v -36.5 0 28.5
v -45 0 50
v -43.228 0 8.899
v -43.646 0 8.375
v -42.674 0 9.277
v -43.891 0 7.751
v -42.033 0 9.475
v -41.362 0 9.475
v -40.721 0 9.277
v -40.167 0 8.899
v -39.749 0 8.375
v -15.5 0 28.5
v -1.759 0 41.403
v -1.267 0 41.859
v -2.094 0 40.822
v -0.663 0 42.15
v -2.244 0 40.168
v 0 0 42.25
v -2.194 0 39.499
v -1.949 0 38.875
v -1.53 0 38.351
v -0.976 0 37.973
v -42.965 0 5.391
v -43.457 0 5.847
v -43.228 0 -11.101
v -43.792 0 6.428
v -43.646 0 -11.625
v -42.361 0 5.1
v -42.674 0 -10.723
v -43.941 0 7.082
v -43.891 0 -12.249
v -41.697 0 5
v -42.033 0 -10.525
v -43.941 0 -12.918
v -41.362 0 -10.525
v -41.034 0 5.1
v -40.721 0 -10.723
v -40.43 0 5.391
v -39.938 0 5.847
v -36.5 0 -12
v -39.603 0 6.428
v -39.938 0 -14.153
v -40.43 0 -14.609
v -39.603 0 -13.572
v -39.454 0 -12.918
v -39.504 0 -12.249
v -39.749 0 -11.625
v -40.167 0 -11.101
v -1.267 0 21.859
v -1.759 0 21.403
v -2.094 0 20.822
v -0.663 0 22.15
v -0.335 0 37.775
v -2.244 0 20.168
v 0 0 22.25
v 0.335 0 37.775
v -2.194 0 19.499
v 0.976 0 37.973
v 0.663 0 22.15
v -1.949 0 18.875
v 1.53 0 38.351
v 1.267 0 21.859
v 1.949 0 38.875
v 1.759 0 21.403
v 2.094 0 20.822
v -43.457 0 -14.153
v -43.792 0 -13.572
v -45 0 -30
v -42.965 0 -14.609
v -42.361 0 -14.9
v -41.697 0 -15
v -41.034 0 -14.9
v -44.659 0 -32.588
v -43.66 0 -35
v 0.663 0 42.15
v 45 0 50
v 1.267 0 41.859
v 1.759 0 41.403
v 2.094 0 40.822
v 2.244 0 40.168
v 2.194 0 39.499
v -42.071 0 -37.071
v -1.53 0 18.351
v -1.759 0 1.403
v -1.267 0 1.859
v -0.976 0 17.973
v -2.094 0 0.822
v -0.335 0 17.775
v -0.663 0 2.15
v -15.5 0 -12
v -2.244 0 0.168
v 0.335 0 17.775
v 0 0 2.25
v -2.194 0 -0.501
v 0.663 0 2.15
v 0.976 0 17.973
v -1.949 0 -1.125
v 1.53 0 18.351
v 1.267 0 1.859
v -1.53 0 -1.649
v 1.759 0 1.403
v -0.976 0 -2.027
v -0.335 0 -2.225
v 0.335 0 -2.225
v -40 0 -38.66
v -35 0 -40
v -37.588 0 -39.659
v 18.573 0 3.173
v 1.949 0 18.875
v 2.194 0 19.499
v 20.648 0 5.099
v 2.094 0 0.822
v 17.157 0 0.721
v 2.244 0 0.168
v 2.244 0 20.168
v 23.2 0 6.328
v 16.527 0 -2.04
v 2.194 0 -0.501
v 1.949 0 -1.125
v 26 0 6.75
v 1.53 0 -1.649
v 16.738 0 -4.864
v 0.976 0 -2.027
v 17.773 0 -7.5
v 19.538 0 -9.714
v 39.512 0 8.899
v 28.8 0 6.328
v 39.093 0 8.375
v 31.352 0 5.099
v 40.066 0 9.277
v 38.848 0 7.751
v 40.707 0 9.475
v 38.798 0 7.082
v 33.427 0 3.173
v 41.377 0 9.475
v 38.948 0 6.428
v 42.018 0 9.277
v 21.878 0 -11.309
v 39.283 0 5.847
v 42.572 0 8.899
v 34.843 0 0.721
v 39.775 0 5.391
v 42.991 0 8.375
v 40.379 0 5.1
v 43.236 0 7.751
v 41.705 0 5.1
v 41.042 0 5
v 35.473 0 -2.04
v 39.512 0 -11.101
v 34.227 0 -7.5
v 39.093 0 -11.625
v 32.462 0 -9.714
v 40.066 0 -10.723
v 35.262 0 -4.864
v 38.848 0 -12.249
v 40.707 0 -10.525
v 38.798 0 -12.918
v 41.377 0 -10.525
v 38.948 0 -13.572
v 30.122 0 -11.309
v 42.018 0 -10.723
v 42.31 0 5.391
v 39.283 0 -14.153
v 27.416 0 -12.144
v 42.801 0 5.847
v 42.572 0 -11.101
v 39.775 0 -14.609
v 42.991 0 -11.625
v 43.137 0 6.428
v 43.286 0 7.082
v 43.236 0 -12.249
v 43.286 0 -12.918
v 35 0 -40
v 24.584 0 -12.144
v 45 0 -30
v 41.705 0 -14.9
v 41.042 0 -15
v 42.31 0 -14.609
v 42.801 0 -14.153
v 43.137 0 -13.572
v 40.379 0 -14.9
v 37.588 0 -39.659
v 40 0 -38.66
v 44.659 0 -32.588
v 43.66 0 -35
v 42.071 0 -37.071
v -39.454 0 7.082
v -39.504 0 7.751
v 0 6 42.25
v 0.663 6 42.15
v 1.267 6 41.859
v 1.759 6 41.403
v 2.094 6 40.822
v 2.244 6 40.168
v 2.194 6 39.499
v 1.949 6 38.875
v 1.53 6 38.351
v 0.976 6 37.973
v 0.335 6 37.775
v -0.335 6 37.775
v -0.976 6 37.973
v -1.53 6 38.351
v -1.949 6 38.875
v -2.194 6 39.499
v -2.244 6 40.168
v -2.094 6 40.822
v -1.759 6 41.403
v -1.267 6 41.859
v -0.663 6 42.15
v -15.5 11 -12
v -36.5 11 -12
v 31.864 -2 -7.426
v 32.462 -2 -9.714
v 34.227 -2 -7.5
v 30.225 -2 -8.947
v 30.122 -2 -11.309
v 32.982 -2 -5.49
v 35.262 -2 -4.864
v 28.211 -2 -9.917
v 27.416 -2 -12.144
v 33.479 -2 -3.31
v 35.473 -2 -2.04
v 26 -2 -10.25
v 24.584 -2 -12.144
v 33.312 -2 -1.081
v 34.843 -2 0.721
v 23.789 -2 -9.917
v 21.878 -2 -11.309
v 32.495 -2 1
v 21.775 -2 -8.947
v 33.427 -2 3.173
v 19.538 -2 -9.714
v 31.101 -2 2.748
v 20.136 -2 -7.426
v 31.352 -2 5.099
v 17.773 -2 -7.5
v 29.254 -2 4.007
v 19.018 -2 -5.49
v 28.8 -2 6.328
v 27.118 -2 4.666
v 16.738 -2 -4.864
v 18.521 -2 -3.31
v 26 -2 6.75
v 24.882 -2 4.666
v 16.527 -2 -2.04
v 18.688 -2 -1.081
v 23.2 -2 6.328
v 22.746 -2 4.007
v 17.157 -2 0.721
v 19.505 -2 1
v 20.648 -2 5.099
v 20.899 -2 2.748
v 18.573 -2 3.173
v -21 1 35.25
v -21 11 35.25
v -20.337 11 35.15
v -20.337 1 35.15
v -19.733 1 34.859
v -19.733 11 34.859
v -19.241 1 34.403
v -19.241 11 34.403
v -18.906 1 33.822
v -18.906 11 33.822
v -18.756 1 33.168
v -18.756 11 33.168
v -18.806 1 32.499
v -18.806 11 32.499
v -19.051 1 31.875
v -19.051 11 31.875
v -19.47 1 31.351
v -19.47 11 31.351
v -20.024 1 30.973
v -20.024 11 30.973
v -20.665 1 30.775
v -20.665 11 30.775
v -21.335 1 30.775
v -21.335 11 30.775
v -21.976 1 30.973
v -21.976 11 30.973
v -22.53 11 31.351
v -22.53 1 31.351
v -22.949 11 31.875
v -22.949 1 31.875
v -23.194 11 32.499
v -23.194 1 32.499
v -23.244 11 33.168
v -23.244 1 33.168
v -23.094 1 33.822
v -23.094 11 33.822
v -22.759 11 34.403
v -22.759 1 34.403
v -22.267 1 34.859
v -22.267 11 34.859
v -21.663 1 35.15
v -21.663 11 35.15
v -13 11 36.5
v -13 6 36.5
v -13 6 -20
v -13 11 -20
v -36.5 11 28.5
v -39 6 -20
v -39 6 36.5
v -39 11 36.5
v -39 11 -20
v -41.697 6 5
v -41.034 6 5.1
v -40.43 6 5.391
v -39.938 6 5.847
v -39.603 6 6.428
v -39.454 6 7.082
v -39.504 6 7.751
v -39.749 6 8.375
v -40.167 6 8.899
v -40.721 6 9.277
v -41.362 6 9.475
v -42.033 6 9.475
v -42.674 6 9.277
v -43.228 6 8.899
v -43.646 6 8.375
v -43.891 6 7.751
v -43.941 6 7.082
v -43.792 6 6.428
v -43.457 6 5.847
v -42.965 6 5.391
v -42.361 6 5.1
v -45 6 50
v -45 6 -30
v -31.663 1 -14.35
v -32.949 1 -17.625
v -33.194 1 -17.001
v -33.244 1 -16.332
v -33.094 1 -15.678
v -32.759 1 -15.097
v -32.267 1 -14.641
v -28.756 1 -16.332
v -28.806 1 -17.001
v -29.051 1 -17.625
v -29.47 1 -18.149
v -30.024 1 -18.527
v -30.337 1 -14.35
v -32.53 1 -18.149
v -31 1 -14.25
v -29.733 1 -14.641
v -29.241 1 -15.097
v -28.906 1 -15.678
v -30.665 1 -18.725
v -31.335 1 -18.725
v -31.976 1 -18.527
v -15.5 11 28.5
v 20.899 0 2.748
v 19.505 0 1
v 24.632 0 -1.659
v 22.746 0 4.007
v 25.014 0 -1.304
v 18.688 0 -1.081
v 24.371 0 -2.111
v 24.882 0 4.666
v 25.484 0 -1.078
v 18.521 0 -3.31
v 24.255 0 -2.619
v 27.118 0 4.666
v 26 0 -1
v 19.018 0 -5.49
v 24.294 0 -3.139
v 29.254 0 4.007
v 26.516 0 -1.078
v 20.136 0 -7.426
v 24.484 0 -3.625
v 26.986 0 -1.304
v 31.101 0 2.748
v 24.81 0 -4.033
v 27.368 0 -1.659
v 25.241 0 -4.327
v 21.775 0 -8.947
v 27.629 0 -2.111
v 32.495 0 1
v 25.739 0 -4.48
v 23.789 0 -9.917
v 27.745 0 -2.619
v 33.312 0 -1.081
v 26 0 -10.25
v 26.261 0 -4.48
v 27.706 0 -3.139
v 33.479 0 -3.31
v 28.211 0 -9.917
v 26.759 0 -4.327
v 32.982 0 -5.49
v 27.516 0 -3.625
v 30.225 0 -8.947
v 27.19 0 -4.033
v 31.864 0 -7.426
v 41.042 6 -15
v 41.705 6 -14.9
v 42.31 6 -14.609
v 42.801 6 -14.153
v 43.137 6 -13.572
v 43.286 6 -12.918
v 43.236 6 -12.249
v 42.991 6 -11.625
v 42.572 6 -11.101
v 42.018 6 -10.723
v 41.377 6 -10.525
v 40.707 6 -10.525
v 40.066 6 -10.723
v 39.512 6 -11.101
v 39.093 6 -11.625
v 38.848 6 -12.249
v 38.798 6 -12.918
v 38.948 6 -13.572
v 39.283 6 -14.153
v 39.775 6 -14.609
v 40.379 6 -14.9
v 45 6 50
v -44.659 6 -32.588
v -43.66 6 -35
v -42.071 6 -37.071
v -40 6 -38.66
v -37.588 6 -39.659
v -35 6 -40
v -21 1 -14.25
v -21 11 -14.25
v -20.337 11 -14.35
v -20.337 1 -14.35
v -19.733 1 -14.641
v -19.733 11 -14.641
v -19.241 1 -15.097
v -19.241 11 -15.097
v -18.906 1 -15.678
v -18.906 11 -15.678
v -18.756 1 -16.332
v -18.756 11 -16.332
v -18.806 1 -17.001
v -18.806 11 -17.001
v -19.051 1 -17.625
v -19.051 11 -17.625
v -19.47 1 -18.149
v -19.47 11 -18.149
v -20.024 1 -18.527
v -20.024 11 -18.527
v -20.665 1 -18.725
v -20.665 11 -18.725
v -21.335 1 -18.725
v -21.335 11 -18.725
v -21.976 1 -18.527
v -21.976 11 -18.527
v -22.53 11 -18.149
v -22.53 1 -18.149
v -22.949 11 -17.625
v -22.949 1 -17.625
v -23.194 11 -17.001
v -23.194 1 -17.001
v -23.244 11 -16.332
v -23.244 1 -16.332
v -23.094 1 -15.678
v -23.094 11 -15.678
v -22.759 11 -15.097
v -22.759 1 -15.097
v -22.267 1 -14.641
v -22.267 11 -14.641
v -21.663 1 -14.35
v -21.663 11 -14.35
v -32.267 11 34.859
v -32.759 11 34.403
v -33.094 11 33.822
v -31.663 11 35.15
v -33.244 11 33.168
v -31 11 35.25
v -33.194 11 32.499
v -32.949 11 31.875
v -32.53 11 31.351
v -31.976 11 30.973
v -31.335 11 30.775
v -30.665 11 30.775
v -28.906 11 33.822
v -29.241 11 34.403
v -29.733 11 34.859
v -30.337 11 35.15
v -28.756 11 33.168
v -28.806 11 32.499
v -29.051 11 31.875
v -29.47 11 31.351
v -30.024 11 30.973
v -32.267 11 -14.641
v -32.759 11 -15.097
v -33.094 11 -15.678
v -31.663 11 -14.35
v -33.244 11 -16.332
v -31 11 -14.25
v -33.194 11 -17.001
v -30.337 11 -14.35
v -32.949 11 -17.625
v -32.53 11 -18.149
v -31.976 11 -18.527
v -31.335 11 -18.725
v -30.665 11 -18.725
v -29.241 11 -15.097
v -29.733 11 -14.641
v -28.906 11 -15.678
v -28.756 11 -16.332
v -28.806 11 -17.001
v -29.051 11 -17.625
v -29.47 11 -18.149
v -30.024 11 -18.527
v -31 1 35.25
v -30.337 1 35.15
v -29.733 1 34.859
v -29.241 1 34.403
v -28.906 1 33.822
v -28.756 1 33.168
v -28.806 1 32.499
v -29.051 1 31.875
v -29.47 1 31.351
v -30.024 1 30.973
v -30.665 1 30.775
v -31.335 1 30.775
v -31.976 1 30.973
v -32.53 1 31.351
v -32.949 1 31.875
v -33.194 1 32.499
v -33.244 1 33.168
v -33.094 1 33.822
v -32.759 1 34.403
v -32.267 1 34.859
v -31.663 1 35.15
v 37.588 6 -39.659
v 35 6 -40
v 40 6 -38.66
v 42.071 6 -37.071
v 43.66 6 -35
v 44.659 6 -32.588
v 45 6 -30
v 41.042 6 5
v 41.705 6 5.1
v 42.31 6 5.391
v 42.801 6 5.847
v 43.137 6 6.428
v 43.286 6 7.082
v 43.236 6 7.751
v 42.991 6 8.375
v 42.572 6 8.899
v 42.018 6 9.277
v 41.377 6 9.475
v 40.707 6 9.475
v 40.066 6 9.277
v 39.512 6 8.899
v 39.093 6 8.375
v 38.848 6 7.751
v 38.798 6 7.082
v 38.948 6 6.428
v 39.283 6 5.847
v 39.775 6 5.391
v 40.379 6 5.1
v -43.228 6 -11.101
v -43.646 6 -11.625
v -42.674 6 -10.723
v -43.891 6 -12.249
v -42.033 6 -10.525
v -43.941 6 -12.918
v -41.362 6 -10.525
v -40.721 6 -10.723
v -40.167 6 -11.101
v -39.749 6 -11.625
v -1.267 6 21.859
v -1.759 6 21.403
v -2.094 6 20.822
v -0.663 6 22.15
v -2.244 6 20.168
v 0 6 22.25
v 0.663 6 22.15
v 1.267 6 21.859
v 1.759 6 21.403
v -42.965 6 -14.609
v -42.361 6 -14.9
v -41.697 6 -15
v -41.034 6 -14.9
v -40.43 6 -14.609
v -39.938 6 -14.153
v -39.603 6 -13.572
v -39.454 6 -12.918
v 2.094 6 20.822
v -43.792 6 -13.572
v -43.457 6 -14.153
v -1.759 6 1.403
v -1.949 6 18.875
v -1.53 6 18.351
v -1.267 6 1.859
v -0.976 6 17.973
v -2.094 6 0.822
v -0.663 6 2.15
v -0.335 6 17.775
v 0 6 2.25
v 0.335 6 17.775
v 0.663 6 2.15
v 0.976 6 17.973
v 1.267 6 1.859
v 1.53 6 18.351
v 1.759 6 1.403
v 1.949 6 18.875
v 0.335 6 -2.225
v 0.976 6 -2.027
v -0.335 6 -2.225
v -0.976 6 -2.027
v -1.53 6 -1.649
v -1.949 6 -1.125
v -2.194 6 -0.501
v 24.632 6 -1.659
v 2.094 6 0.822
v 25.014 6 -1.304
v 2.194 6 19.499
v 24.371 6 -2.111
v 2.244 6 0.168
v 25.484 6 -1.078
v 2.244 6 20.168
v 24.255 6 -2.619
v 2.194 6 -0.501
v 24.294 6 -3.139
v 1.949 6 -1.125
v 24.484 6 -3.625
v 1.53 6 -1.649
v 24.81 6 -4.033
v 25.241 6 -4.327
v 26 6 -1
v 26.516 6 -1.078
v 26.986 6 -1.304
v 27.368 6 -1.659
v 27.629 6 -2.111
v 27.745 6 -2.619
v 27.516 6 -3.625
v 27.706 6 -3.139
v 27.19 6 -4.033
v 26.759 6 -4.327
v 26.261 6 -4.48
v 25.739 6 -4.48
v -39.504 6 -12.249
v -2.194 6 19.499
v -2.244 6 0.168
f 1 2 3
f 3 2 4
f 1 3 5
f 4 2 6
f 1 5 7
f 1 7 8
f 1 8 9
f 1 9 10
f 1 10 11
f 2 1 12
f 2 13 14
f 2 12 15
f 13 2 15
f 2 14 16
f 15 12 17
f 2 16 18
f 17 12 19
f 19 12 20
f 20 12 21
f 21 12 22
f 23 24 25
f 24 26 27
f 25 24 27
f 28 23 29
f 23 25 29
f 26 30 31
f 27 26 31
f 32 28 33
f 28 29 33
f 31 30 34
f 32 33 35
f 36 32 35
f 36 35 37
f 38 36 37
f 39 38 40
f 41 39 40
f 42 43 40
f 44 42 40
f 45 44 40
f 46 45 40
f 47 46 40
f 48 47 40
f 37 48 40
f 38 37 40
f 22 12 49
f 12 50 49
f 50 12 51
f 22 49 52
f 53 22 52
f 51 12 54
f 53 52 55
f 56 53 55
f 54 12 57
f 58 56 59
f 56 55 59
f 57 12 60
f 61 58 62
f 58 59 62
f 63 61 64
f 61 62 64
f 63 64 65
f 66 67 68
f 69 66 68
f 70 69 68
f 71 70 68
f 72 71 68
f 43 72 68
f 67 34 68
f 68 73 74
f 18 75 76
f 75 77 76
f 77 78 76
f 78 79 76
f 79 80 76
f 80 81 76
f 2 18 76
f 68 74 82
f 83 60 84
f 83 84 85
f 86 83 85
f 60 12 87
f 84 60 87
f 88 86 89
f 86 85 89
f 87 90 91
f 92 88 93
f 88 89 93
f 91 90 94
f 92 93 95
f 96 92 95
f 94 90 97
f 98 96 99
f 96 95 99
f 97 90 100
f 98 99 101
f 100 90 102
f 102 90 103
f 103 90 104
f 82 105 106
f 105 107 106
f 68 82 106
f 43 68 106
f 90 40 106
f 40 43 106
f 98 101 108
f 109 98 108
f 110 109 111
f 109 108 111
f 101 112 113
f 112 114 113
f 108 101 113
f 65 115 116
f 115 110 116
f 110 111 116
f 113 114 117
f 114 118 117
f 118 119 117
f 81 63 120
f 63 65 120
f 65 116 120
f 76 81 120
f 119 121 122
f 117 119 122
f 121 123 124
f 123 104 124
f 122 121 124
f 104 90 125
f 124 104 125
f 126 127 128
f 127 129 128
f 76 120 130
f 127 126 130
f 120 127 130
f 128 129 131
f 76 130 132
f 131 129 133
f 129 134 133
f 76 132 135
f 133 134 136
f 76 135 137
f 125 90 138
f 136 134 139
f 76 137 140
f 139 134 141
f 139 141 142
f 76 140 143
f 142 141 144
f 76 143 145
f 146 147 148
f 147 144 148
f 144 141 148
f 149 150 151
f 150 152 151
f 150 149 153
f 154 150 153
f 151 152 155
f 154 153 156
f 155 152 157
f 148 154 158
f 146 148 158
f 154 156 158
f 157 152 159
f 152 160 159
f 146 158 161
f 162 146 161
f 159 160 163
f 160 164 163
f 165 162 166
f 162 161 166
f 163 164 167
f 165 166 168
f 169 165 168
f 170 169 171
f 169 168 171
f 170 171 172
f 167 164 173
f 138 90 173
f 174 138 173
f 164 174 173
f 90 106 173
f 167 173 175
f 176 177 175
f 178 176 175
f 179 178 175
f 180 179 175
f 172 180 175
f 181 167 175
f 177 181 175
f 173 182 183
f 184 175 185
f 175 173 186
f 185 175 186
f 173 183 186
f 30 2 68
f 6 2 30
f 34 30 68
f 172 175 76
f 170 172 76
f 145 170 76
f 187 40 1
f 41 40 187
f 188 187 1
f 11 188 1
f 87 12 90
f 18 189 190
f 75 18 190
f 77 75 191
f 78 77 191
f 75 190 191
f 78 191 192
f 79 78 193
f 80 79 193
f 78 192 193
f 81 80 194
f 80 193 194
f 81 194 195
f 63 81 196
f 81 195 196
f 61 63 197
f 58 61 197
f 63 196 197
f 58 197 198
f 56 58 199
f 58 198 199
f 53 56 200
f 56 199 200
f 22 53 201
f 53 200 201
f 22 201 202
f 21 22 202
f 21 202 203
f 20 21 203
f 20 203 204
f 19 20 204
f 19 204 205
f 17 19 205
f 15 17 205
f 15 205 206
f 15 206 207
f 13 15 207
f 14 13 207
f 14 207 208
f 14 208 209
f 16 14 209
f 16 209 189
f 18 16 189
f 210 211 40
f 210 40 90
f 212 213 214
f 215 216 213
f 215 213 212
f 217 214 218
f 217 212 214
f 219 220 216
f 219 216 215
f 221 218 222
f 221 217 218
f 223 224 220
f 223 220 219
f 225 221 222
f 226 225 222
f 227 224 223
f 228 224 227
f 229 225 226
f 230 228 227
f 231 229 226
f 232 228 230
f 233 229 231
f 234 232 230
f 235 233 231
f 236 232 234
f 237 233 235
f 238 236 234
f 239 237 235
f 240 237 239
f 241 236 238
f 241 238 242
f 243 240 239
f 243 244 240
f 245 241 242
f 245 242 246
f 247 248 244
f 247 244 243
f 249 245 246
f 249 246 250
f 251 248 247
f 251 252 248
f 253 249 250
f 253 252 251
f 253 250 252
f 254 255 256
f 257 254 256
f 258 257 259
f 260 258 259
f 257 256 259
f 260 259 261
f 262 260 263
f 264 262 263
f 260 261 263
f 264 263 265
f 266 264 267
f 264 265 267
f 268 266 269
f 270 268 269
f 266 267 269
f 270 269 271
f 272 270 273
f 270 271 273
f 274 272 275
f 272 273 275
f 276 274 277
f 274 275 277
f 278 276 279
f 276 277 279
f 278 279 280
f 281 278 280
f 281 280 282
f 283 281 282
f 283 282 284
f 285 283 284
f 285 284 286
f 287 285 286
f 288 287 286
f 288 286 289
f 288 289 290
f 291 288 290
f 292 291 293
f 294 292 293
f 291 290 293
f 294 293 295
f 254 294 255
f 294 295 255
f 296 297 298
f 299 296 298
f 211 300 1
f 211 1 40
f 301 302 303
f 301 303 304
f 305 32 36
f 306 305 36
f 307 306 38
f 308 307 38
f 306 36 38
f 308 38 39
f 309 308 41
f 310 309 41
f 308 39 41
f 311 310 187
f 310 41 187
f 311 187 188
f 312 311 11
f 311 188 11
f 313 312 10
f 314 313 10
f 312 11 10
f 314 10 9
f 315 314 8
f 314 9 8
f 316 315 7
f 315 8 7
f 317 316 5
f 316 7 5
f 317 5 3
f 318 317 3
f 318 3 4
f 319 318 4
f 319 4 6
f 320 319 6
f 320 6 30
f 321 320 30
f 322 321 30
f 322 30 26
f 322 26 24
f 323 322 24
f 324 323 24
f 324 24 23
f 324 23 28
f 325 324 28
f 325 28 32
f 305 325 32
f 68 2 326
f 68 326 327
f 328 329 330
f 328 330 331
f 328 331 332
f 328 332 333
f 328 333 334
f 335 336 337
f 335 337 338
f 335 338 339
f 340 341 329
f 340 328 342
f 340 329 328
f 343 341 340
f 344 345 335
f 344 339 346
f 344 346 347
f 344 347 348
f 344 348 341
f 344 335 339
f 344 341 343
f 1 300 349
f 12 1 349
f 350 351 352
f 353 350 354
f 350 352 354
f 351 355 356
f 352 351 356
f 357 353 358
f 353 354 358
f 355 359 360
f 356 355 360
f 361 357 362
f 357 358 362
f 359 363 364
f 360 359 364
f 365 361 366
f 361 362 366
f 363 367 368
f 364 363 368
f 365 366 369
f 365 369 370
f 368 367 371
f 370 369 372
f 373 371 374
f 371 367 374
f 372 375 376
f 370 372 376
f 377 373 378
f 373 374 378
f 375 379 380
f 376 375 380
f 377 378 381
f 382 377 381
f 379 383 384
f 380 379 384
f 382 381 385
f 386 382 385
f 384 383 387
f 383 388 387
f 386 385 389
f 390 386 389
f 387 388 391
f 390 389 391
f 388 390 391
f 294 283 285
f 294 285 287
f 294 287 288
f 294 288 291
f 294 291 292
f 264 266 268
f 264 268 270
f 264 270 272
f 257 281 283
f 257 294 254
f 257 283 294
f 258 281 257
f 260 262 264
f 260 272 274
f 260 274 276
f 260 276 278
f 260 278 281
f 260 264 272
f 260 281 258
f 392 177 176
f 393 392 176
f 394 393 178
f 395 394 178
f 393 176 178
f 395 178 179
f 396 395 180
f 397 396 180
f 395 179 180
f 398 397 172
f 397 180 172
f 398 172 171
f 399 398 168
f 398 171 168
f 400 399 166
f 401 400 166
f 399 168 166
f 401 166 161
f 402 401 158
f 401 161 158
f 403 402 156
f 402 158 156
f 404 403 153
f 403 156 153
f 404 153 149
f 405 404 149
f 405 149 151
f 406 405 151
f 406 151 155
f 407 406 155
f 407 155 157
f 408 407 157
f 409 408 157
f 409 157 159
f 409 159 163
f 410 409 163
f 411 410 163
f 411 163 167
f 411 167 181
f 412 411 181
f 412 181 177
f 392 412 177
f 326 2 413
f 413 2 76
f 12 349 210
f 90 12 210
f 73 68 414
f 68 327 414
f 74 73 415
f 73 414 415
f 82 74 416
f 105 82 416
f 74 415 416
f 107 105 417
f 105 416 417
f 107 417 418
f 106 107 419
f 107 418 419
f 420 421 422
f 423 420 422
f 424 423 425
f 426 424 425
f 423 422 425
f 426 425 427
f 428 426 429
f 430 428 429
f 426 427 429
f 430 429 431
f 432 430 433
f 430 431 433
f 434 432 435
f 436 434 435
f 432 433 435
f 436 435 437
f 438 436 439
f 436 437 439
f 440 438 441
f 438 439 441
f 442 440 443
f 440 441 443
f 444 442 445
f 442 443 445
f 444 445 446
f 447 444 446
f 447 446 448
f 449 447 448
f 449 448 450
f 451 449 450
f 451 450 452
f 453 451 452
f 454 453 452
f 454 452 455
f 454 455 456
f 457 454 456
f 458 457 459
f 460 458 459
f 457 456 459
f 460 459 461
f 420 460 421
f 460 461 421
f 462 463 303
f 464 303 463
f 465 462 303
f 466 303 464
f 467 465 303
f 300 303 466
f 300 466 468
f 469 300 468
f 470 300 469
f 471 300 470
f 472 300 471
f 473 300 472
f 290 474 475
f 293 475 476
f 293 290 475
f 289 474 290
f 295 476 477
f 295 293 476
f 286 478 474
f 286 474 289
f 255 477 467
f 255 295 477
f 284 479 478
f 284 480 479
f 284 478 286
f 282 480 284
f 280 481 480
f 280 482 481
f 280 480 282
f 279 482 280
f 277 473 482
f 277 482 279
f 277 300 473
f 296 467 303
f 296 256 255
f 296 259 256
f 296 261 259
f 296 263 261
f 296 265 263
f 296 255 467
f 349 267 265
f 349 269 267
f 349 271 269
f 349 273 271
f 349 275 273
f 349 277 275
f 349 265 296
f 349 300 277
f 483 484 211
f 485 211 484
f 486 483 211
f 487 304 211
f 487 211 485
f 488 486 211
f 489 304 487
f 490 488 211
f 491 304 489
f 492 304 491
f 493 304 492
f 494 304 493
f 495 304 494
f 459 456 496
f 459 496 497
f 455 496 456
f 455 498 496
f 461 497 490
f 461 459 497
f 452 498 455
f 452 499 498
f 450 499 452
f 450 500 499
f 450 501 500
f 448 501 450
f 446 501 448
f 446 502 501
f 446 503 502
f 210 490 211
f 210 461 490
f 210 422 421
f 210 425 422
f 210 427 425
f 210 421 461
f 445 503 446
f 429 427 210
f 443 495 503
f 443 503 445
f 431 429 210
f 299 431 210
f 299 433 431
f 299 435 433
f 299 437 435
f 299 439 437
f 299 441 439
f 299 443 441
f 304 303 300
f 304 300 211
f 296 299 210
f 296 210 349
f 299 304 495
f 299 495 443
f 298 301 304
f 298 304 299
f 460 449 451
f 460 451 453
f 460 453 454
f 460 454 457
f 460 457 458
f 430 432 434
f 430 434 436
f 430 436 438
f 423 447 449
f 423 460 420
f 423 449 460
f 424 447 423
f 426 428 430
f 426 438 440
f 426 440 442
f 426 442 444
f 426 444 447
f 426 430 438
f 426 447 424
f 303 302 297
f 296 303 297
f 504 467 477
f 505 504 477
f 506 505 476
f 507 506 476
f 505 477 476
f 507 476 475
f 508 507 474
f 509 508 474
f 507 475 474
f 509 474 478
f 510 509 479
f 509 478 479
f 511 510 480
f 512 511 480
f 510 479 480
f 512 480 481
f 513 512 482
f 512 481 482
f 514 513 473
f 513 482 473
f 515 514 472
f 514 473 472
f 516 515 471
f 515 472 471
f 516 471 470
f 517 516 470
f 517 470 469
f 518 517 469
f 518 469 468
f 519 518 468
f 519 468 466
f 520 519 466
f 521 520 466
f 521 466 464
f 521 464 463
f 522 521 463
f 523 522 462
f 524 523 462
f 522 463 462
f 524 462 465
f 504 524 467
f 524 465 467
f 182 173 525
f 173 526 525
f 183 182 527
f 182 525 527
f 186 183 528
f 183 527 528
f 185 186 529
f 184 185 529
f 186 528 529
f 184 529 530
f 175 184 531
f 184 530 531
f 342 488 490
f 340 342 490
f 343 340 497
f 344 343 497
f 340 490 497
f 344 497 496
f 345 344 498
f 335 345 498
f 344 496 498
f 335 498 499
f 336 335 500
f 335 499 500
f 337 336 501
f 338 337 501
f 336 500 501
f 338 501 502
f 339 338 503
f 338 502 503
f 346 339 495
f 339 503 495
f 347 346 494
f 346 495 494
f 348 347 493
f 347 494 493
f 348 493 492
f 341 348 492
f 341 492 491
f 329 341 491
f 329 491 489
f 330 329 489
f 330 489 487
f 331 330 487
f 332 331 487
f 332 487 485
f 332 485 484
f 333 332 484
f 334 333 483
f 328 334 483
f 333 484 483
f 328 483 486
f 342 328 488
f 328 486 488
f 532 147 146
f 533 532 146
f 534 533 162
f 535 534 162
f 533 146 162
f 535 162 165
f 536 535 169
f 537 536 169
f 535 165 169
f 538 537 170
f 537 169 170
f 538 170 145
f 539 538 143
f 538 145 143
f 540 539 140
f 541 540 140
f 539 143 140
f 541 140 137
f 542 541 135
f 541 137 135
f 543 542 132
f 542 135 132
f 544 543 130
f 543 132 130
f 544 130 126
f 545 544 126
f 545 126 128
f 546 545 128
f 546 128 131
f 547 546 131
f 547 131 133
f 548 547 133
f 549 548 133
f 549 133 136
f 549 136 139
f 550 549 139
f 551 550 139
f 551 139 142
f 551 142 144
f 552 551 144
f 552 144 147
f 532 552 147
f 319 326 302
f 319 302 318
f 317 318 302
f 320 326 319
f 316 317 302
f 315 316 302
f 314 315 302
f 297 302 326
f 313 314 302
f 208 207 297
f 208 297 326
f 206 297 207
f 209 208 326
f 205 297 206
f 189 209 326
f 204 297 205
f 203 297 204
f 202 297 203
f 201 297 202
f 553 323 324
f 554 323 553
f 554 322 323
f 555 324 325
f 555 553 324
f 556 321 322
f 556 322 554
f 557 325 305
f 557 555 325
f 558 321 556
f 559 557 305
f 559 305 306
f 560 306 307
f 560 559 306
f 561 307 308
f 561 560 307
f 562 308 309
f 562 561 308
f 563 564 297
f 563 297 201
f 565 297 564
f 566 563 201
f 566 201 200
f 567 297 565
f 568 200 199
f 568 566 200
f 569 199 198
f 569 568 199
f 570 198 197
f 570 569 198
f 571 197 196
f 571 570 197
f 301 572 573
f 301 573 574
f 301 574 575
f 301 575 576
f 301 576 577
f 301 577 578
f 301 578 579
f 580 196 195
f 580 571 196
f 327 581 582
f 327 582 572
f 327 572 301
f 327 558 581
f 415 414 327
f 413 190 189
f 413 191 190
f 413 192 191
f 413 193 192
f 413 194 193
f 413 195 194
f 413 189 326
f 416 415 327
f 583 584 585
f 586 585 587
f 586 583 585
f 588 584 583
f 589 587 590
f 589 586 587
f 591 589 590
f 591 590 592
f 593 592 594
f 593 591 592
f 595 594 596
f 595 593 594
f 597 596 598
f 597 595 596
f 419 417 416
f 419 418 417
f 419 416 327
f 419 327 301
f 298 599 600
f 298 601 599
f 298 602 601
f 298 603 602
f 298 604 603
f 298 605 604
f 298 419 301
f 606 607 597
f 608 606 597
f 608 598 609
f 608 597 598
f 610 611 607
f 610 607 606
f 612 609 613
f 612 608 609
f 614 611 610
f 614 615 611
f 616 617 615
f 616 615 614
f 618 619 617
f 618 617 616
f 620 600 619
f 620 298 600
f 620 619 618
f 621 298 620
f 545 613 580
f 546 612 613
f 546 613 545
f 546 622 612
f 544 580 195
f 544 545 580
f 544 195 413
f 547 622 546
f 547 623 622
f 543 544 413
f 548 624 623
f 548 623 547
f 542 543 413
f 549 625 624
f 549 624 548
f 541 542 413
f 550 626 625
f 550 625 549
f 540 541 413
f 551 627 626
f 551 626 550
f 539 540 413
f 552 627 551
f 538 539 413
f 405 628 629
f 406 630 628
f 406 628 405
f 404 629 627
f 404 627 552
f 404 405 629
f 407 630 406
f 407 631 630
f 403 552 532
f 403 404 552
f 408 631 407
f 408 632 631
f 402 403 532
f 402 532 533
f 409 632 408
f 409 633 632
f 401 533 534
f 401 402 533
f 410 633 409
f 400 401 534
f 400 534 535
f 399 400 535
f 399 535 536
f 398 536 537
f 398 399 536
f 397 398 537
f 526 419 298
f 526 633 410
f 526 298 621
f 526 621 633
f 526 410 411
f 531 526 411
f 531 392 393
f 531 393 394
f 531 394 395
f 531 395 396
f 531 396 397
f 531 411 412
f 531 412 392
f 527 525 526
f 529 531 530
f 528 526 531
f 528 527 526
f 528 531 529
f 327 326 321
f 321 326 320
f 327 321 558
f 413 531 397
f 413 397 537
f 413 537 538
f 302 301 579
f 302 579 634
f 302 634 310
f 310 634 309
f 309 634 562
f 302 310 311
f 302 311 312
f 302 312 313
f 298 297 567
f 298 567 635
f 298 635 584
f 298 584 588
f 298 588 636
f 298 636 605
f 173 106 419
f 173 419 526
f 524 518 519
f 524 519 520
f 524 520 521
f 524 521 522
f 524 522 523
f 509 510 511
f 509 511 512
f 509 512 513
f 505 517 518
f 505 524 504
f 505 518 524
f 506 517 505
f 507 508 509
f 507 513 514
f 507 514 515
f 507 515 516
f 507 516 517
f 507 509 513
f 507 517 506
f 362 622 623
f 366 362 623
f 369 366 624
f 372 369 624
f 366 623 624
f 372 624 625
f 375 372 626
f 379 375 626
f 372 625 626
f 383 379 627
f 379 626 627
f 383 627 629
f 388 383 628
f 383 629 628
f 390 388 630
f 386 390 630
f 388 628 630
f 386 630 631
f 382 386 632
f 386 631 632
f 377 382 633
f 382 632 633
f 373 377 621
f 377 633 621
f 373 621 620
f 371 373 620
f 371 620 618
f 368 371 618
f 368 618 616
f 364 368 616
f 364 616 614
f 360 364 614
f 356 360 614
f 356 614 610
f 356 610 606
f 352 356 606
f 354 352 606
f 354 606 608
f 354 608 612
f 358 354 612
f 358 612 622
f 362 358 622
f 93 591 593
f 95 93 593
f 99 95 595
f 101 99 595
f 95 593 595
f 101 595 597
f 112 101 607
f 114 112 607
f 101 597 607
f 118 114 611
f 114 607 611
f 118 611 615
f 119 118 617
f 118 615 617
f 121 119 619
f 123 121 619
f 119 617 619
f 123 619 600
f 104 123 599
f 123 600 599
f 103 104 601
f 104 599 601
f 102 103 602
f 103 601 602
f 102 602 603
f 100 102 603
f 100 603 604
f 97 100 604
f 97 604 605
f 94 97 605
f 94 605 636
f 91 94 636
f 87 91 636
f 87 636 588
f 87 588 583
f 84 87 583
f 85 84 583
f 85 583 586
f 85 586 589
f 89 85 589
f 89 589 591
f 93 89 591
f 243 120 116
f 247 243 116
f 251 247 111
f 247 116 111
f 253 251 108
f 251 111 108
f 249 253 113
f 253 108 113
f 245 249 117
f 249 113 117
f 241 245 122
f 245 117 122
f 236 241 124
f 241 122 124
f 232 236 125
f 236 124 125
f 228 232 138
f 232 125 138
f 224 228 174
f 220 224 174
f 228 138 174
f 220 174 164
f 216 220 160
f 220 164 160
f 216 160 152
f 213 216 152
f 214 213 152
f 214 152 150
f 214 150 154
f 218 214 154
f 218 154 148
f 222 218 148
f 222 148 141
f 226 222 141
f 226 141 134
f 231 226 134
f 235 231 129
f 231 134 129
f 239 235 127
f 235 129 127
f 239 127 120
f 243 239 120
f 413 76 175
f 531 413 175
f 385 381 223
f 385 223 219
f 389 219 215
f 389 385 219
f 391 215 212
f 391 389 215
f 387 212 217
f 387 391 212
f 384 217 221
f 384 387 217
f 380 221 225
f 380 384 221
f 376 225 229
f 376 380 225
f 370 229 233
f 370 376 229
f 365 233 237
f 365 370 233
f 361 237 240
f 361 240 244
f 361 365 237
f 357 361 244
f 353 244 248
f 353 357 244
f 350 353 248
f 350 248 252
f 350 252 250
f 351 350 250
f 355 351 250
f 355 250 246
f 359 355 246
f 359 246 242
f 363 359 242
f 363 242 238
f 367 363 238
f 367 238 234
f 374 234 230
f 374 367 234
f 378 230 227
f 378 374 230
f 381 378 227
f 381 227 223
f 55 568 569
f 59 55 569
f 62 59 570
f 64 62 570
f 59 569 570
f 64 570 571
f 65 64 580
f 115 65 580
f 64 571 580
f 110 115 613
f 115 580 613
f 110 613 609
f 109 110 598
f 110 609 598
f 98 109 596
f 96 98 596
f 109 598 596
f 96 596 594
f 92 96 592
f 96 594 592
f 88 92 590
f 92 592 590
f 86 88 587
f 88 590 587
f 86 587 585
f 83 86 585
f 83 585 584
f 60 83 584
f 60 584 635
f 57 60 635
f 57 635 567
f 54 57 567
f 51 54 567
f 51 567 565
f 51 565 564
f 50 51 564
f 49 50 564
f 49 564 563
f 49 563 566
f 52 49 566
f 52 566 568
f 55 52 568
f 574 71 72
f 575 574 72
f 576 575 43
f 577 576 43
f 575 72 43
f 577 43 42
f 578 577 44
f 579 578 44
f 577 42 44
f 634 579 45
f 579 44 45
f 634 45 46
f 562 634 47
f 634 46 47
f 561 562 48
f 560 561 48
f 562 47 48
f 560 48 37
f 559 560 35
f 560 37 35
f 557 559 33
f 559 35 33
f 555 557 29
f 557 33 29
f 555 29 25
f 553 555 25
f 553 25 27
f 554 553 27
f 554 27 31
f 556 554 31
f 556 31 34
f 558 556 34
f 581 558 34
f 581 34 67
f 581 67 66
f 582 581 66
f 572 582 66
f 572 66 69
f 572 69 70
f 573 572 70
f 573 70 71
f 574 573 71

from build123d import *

# Parameters (mm, degrees)
SKETCH1_W           = 90
SKETCH1_H           = 90
BOSS_EXTRUDE1_DEPTH = 6
SKETCH2_W           = 26
SKETCH2_H           = 56.5
BOSS_EXTRUDE2_DEPTH = 5
SKETCH3_W           = 21
SKETCH3_H           = 40.5
CUT_EXTRUDE1_DEPTH  = 12
SKETCH4_R           = 2.25
CUT_EXTRUDE2_DEPTH  = 10
SKETCH5_R           = 1.75
CUT_EXTRUDE3_DEPTH  = 11
FILLET1_R           = 10
FILLET2_R           = 10
SKETCH6_R           = 2.25
CUT_EXTRUDE4_DEPTH  = 11
SKETCH7_R           = 9.5
SKETCH7_R_2         = 7.5
BOSS_EXTRUDE3_DEPTH = 2
SKETCH8_R           = 2.25
CUT_EXTRUDE5_DEPTH  = 10


with BuildPart() as part:
    # Sketch1 → Boss-Extrude1 (new body)
    with BuildSketch(Plane(origin=(0, 0, 0), x_dir=(1, 0, 0), z_dir=(0, 1, 0))):
        with Locations((0, -5)):
            Rectangle(SKETCH1_W, SKETCH1_H)
    extrude(amount=BOSS_EXTRUDE1_DEPTH)

    # Sketch2 → Boss-Extrude2 (add)
    with BuildSketch(Plane(origin=(0, 6, 0), x_dir=(1, 0, 0), z_dir=(0, 1, 0))):
        with Locations((-26, -8.25)):
            Rectangle(SKETCH2_W, SKETCH2_H)
    extrude(amount=BOSS_EXTRUDE2_DEPTH)

    # Sketch3 → Cut-Extrude1 (cut)
    with BuildSketch(Plane(origin=(0, 11, 0), x_dir=(1, 0, 0), z_dir=(0, 1, 0))):
        with Locations((-26, -8.25)):
            Rectangle(SKETCH3_W, SKETCH3_H)
    extrude(amount=-CUT_EXTRUDE1_DEPTH, mode=Mode.SUBTRACT)

    # Sketch4 → Cut-Extrude2 (cut)
    with BuildSketch(Plane(origin=(0, 11, 0), x_dir=(1, 0, 0), z_dir=(0, 1, 0))):
        with Locations(Location((-31, 16.5, 0), (0, 0, 270))):
            Circle(SKETCH4_R)
        with Locations(Location((-21, 16.5, 0), (0, 0, 270))):
            Circle(SKETCH4_R)
        with Locations(Location((-31, -33, 0), (0, 0, 270))):
            Circle(SKETCH4_R)
        with Locations(Location((-21, -33, 0), (0, 0, 270))):
            Circle(SKETCH4_R)
    extrude(amount=-CUT_EXTRUDE2_DEPTH, mode=Mode.SUBTRACT)

    # Sketch5 → Cut-Extrude3 (cut)
    with BuildSketch(Plane(origin=(0, 6, 0), x_dir=(1, 0, 0), z_dir=(0, 1, 0))):
        with Locations(Location((26, 2.75, 0), (0, 0, 270))):
            Circle(SKETCH5_R)
    extrude(amount=-CUT_EXTRUDE3_DEPTH, mode=Mode.SUBTRACT)

    # Fillet1
    fillet1_edges = [part.edges().sort_by_distance(p)[0] for p in [
        (-45, 3, -40),
    ]]
    fillet(fillet1_edges, radius=FILLET1_R)

    # Fillet2
    fillet2_edges = [part.edges().sort_by_distance(p)[0] for p in [
        (45, 3, -40),
    ]]
    fillet(fillet2_edges, radius=FILLET2_R)

    # Sketch6 → Cut-Extrude4 (cut)
    with BuildSketch(Plane(origin=(0, 0, 0), x_dir=(-1, 0, 0), z_dir=(0, -1, 0))):
        with Locations(Location((-41.042034918, 12.75, 0), (0, 0, 90))):
            Circle(SKETCH6_R)
        with Locations(Location((41.697396753, 12.75, 0), (0, 0, 90))):
            Circle(SKETCH6_R)
        with Locations(Location((-41.042034918, -7.25, 0), (0, 0, 90))):
            Circle(SKETCH6_R)
        with Locations(Location((41.697396753, -7.25, 0), (0, 0, 90))):
            Circle(SKETCH6_R)
    extrude(amount=-CUT_EXTRUDE4_DEPTH, mode=Mode.SUBTRACT)

    # Sketch7 → Boss-Extrude3 (add)
    with BuildSketch(Plane(origin=(0, 0, 0), x_dir=(-1, 0, 0), z_dir=(0, -1, 0))):
        with Locations(Location((-26, 2.75, 0), (0, 0, 270))):
            Circle(SKETCH7_R)
        with Locations(Location((-26, 2.75, 0), (0, 0, 90))):
            Circle(SKETCH7_R_2, mode=Mode.SUBTRACT)
    extrude(amount=BOSS_EXTRUDE3_DEPTH)

    # Sketch8 → Cut-Extrude5 (cut)
    with BuildSketch(Plane(origin=(0, 6, 0), x_dir=(1, 0, 0), z_dir=(0, 1, 0))):
        with Locations(Location((0, 0, 0), (0, 0, 270))):
            Circle(SKETCH8_R)
        with Locations(Location((0, -20, 0), (0, 0, 270))):
            Circle(SKETCH8_R)
        with Locations(Location((0, -40, 0), (0, 0, 270))):
            Circle(SKETCH8_R)
    extrude(amount=-CUT_EXTRUDE5_DEPTH, mode=Mode.SUBTRACT)


solid = part.part
